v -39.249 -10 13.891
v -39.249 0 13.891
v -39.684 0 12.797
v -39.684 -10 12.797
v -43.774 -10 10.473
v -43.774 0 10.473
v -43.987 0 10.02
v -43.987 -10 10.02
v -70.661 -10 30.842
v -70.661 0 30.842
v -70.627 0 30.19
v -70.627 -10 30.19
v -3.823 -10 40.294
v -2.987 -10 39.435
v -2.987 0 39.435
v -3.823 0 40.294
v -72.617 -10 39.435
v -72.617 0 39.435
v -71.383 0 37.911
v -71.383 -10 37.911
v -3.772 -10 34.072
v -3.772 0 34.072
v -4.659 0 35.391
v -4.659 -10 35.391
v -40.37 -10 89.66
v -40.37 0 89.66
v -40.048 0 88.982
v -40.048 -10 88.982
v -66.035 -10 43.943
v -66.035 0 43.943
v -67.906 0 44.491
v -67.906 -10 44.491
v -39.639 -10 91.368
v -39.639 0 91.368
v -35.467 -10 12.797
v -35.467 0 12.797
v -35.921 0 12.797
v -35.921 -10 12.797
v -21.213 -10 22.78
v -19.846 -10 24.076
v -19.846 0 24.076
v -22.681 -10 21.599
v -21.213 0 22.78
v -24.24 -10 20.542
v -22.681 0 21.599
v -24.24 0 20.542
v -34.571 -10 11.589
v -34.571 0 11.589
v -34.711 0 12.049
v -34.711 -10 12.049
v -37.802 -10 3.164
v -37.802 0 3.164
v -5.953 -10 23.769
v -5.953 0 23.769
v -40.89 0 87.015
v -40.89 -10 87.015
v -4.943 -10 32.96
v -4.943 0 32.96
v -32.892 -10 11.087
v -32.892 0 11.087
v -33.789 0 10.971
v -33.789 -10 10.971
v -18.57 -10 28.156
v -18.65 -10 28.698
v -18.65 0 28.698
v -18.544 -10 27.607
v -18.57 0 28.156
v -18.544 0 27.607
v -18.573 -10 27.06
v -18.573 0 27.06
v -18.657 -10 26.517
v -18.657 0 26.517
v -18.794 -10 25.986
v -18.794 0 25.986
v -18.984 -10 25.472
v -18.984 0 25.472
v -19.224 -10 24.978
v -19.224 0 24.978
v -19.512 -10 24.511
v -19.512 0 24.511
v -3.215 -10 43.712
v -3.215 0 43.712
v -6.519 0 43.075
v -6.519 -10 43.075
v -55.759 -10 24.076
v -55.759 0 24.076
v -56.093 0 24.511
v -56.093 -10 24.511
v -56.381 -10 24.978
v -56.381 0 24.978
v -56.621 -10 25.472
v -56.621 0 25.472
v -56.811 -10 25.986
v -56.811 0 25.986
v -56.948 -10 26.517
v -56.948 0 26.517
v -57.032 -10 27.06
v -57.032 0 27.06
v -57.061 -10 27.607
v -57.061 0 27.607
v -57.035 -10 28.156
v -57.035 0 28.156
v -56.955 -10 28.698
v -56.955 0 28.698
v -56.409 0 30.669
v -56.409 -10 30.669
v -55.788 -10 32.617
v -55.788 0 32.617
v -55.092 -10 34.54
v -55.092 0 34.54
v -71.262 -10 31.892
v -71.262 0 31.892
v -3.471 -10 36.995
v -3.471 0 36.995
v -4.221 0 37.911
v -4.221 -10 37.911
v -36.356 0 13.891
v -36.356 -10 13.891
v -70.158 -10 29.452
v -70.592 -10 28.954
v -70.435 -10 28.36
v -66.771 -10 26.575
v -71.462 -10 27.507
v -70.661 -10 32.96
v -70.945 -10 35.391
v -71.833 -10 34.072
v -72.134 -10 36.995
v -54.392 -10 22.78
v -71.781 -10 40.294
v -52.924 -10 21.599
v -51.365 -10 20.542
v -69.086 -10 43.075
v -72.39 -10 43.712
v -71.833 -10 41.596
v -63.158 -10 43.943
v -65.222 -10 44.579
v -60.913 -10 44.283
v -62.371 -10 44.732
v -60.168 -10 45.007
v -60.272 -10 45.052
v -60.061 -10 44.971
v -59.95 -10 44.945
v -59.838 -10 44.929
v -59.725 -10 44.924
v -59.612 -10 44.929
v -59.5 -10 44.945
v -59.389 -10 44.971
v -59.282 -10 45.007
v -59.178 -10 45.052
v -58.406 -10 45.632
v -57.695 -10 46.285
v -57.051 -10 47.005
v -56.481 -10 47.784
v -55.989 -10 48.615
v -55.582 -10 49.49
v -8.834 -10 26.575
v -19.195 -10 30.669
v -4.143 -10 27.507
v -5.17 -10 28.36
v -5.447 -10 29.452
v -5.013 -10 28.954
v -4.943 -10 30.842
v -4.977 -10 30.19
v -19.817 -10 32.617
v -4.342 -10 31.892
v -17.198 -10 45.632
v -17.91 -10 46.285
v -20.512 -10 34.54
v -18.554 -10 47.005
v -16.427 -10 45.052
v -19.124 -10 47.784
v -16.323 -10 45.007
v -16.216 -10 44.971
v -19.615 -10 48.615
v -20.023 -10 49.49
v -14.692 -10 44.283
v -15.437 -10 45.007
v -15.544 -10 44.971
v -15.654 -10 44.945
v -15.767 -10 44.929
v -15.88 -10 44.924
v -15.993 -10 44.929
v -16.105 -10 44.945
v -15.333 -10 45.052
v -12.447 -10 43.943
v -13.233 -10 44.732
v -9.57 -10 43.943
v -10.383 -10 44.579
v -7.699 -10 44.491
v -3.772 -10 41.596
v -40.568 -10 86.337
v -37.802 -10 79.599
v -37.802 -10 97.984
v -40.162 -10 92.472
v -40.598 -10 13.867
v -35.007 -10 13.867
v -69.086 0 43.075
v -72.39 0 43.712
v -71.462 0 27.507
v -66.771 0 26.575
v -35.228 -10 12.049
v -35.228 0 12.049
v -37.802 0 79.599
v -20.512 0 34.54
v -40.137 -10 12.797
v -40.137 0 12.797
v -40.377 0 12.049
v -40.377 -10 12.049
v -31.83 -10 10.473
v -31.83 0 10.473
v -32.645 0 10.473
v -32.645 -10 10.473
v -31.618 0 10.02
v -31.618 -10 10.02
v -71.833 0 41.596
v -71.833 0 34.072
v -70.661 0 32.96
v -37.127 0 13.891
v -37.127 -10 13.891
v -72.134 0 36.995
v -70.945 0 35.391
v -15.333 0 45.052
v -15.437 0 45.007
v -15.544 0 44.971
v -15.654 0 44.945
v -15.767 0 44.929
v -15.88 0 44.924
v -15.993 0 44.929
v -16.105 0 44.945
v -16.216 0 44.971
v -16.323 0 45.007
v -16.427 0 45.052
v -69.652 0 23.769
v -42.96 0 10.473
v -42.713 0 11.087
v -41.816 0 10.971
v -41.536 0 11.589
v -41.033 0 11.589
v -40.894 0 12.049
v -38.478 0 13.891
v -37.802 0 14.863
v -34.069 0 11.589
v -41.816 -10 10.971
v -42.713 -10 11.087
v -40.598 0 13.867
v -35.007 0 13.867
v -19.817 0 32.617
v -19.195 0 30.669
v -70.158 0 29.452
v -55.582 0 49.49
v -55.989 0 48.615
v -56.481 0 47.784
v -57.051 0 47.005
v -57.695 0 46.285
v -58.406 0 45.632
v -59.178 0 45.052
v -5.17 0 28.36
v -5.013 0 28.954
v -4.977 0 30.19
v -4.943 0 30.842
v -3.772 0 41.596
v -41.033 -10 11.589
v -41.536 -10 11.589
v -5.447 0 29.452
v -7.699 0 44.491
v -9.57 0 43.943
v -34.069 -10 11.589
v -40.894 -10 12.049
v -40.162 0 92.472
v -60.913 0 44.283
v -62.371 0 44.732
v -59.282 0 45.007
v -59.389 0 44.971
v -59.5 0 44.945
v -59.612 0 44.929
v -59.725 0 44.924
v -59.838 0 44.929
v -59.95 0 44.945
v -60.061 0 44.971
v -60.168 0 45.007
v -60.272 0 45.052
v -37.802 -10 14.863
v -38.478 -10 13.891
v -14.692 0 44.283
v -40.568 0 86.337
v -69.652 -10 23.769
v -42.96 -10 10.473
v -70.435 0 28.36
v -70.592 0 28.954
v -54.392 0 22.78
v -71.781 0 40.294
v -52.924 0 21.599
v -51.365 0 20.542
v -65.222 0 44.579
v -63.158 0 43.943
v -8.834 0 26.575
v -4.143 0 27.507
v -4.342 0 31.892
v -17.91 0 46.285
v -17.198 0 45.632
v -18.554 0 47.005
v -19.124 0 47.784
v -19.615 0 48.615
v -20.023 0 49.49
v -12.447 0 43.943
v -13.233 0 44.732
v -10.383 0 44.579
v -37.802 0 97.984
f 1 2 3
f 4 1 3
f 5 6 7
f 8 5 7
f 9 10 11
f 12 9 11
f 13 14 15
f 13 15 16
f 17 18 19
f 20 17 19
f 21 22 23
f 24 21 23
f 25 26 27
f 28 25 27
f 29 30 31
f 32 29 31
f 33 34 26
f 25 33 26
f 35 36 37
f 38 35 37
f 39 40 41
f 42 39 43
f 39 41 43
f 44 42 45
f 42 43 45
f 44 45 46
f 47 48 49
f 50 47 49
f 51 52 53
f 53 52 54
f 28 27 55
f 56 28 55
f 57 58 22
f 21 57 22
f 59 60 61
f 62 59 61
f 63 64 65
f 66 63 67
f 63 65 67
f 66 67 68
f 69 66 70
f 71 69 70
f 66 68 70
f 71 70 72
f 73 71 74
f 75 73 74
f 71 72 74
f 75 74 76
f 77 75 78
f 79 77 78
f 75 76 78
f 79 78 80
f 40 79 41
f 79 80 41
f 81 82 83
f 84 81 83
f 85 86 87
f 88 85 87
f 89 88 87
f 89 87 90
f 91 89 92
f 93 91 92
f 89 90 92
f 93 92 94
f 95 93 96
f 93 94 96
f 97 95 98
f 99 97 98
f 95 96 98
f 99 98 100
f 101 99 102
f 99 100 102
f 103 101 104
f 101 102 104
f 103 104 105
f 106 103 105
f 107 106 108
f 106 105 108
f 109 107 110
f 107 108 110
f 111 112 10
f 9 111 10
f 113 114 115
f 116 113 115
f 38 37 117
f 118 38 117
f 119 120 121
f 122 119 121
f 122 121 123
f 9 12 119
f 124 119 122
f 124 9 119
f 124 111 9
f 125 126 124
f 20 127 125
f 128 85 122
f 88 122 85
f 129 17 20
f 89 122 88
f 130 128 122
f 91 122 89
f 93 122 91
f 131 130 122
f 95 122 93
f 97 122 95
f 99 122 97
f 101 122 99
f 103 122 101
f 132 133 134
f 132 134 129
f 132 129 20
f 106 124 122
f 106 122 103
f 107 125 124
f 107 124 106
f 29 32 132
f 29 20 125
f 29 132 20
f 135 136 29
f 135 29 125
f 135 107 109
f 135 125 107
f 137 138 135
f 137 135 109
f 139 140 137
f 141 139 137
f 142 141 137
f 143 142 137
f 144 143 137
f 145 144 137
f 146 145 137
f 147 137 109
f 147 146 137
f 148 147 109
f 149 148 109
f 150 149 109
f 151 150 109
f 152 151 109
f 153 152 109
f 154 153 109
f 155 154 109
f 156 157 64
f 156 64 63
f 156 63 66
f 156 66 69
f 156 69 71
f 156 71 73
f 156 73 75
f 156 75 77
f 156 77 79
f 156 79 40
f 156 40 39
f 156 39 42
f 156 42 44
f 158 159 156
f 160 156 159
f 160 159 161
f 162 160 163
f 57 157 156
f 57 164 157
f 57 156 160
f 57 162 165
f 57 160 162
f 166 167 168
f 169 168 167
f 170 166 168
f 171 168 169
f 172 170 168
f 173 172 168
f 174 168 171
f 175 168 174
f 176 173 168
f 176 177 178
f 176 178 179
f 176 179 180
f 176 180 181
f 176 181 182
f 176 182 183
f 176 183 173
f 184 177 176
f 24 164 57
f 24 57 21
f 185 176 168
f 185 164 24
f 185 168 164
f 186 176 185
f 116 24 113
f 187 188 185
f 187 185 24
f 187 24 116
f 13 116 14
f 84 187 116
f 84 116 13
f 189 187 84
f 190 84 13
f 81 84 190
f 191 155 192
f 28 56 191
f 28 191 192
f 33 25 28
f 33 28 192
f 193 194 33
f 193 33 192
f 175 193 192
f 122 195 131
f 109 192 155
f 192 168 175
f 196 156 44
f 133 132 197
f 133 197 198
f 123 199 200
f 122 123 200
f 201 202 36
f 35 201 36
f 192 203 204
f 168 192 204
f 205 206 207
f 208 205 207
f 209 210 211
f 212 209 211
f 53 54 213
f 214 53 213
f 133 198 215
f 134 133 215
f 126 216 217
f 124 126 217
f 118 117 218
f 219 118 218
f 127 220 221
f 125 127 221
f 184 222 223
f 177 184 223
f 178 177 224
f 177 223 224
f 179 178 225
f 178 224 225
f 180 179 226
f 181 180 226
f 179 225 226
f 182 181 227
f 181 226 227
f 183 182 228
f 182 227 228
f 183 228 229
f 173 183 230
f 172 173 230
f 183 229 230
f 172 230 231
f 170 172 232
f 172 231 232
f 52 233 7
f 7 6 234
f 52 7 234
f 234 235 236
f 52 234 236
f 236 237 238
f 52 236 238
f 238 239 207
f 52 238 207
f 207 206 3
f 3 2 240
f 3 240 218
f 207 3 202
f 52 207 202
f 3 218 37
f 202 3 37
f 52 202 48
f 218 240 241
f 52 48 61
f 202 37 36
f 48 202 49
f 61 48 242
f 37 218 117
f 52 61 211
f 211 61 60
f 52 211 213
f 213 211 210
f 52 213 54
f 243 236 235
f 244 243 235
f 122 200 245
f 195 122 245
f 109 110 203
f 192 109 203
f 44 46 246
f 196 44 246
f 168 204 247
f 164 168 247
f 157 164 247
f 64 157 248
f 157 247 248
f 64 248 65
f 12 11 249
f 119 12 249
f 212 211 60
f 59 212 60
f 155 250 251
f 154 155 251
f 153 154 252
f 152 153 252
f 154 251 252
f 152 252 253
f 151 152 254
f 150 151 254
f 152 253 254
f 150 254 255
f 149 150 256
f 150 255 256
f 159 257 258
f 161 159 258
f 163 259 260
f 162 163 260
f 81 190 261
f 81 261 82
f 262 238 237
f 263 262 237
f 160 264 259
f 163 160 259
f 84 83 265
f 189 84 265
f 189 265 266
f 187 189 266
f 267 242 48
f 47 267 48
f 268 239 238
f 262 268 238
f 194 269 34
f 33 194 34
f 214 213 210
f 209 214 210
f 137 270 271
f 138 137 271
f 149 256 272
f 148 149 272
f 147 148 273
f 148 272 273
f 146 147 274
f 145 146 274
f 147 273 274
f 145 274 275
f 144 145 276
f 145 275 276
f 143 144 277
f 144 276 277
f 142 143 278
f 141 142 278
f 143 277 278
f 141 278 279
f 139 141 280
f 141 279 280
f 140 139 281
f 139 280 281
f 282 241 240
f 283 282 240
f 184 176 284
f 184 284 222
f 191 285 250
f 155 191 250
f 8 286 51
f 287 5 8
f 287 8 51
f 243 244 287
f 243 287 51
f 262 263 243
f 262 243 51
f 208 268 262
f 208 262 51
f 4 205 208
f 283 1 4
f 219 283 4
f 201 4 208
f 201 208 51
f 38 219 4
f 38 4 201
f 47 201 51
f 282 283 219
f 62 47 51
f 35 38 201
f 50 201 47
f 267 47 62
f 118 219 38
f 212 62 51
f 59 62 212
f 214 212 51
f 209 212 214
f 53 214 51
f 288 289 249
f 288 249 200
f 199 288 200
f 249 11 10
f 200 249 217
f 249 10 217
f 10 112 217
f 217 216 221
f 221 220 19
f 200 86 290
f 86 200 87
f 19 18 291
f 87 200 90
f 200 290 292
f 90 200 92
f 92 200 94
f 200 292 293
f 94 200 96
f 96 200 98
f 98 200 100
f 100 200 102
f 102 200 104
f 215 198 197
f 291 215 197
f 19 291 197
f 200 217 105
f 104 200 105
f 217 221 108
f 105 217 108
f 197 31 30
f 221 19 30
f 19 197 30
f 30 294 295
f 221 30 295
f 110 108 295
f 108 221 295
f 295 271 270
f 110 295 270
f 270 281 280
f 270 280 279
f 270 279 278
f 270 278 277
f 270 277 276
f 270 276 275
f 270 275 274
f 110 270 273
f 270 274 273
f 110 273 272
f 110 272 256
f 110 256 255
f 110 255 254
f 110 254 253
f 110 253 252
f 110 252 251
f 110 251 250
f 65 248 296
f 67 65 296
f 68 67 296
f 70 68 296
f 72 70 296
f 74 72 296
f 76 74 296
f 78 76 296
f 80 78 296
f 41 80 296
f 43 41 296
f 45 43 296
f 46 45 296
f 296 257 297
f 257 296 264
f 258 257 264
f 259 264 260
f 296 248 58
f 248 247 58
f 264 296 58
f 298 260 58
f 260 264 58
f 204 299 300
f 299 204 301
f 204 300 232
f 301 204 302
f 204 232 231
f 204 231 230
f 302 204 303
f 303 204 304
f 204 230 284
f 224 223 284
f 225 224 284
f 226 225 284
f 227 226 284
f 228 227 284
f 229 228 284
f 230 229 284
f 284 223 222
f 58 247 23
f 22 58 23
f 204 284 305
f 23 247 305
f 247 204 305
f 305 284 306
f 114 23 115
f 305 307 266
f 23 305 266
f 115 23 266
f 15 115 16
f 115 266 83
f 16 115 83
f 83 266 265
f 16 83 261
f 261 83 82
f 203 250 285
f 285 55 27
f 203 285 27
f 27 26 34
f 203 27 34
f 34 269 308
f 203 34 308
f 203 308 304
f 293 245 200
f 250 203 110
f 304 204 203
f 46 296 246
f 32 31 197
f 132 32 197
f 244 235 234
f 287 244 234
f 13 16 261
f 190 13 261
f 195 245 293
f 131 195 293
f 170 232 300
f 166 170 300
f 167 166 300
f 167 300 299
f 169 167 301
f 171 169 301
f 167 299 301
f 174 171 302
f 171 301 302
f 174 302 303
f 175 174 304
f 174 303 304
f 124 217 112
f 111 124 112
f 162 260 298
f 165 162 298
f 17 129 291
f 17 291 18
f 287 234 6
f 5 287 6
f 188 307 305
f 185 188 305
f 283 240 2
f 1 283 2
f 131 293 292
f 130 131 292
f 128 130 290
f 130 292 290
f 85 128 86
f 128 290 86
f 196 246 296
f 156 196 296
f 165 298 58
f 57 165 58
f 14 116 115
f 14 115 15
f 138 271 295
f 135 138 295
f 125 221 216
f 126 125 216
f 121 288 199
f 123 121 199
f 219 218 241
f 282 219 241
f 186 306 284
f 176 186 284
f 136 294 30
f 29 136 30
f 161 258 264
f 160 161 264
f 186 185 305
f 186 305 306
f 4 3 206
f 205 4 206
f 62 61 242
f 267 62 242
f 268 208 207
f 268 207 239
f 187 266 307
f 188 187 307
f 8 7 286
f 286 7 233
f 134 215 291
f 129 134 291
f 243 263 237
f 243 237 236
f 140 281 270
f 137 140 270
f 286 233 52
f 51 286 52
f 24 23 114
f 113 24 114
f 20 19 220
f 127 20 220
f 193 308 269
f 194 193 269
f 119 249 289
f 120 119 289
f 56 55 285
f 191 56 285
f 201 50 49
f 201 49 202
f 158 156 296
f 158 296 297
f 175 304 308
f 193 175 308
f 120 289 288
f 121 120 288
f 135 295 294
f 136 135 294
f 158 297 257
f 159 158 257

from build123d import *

# Parameters (mm, degrees)
F1_DEPTH = 10


with BuildPart() as f1:
    # F0 (on Front) → F1 (new body)
    with BuildSketch(Plane.XZ):
        with BuildLine():
            Line((-20.023162, 49.490344), (-37.802389, 97.984103))
            Line((-37.802389, 97.984103), (-40.162235, 92.471808))
            Line((-40.162235, 92.471808), (-39.638641, 91.367855))
            Line((-39.638641, 91.367855), (-40.36975, 89.660078))
            Line((-40.36975, 89.660078), (-40.048006, 88.981708))
            Line((-40.048006, 88.981708), (-40.889924, 87.015097))
            Line((-40.889924, 87.015097), (-40.568179, 86.336727))
            Line((-40.568179, 86.336727), (-55.581615, 49.490344))
            ThreePointArc((-55.581615, 49.490344), (-57.051152, 47.004917), (-59.178055, 45.052186))
            ThreePointArc((-59.178055, 45.052186), (-59.724961, 44.924177), (-60.271867, 45.052186))
            Line((-60.271867, 45.052186), (-60.912725, 44.282753))
            Line((-60.912725, 44.282753), (-62.371388, 44.73231))
            Line((-62.371388, 44.73231), (-63.157685, 43.942872))
            Line((-63.157685, 43.942872), (-65.222082, 44.579115))
            Line((-65.222082, 44.579115), (-66.034637, 43.942872))
            Line((-66.034637, 43.942872), (-67.906208, 44.49058))
            Line((-67.906208, 44.49058), (-69.08562, 43.074805))
            Line((-69.08562, 43.074805), (-72.389983, 43.711789))
            Line((-72.389983, 43.711789), (-71.83262, 41.596085))
            Line((-71.83262, 41.596085), (-71.781434, 40.293675))
            Line((-71.781434, 40.293675), (-72.617479, 39.43488))
            Line((-72.617479, 39.43488), (-71.38332, 37.910666))
            Line((-71.38332, 37.910666), (-72.134055, 36.994997))
            Line((-72.134055, 36.994997), (-70.945397, 35.391156))
            Line((-70.945397, 35.391156), (-71.83262, 34.071684))
            Line((-71.83262, 34.071684), (-70.661329, 32.960273))
            Line((-70.661329, 32.960273), (-71.262464, 31.892184))
            Line((-71.262464, 31.892184), (-70.661329, 30.842416))
            Line((-70.661329, 30.842416), (-70.627424, 30.190499))
            Line((-70.627424, 30.190499), (-70.158075, 29.452435))
            Line((-70.158075, 29.452435), (-70.591594, 28.954421))
            Line((-70.591594, 28.954421), (-70.435083, 28.36032))
            Line((-70.435083, 28.36032), (-71.462224, 27.506962))
            Line((-71.462224, 27.506962), (-66.771212, 26.575134))
            Line((-66.771212, 26.575134), (-40.597859, 13.866938))
            Line((-40.597859, 13.866938), (-51.364633, 20.542177))
            ThreePointArc((-51.364633, 20.542177), (-53.670059, 22.174499), (-55.759269, 24.075725))
            ThreePointArc((-55.759269, 24.075725), (-56.885933, 26.250187), (-56.955031, 28.698224))
            ThreePointArc((-56.955031, 28.698224), (-56.108077, 31.645961), (-55.092435, 34.539913))
            Line((-55.092435, 34.539913), (-37.802389, 79.59909))
            Line((-37.802389, 79.59909), (-20.512342, 34.539913))
            ThreePointArc((-20.512342, 34.539913), (-19.4967, 31.645961), (-18.649746, 28.698224))
            ThreePointArc((-18.649746, 28.698224), (-18.718844, 26.250187), (-19.845508, 24.075725))
            ThreePointArc((-19.845508, 24.075725), (-21.934718, 22.174499), (-24.240144, 20.542177))
            Line((-24.240144, 20.542177), (-35.006918, 13.866938))
            Line((-35.006918, 13.866938), (-8.833565, 26.575134))
            Line((-8.833565, 26.575134), (-4.142553, 27.506962))
            Line((-4.142553, 27.506962), (-5.169694, 28.36032))
            Line((-5.169694, 28.36032), (-5.013183, 28.954421))
            Line((-5.013183, 28.954421), (-5.446703, 29.452435))
            Line((-5.446703, 29.452435), (-4.977353, 30.190499))
            Line((-4.977353, 30.190499), (-4.943448, 30.842416))
            Line((-4.943448, 30.842416), (-4.342313, 31.892184))
            Line((-4.342313, 31.892184), (-4.943448, 32.960273))
            Line((-4.943448, 32.960273), (-3.772157, 34.071684))
            Line((-3.772157, 34.071684), (-4.65938, 35.391156))
            Line((-4.65938, 35.391156), (-3.470722, 36.994997))
            Line((-3.470722, 36.994997), (-4.221457, 37.910666))
            Line((-4.221457, 37.910666), (-2.987298, 39.43488))
            Line((-2.987298, 39.43488), (-3.823343, 40.293675))
            Line((-3.823343, 40.293675), (-3.772157, 41.596085))
            Line((-3.772157, 41.596085), (-3.214794, 43.711789))
            Line((-3.214794, 43.711789), (-6.519157, 43.074805))
            Line((-6.519157, 43.074805), (-7.698569, 44.49058))
            Line((-7.698569, 44.49058), (-9.57014, 43.942872))
            Line((-9.57014, 43.942872), (-10.382695, 44.579115))
            Line((-10.382695, 44.579115), (-12.447092, 43.942872))
            Line((-12.447092, 43.942872), (-13.233389, 44.73231))
            Line((-13.233389, 44.73231), (-14.692053, 44.282753))
            Line((-14.692053, 44.282753), (-15.33291, 45.052186))
            ThreePointArc((-15.33291, 45.052186), (-15.879816, 44.924177), (-16.426722, 45.052186))
            ThreePointArc((-16.426722, 45.052186), (-18.553625, 47.004917), (-20.023162, 49.490344))
        make_face()
        Polygon((-43.98706, 10.019898), (-69.651601, 23.76935), (-37.802389, 3.164015), (-5.953176, 23.76935), (-31.617717, 10.019898), (-31.8305, 10.47263), (-32.64464, 10.47263), (-32.892051, 11.087263), (-33.789008, 10.971455), (-34.068619, 11.589255), (-34.571313, 11.589255), (-34.711081, 12.048906), (-35.227652, 12.048906), (-35.467327, 12.796801), (-35.921224, 12.796801), (-36.356118, 13.891008), (-37.126948, 13.891008), (-37.802389, 14.863268), (-38.47783, 13.891008), (-39.248659, 13.891008), (-39.683553, 12.796801), (-40.13745, 12.796801), (-40.377125, 12.048906), (-40.893696, 12.048906), (-41.033464, 11.589255), (-41.536158, 11.589255), (-41.815769, 10.971455), (-42.712726, 11.087263), (-42.960137, 10.47263), (-43.774277, 10.47263), align=None)
    extrude(amount=F1_DEPTH)


solid = f1.part
